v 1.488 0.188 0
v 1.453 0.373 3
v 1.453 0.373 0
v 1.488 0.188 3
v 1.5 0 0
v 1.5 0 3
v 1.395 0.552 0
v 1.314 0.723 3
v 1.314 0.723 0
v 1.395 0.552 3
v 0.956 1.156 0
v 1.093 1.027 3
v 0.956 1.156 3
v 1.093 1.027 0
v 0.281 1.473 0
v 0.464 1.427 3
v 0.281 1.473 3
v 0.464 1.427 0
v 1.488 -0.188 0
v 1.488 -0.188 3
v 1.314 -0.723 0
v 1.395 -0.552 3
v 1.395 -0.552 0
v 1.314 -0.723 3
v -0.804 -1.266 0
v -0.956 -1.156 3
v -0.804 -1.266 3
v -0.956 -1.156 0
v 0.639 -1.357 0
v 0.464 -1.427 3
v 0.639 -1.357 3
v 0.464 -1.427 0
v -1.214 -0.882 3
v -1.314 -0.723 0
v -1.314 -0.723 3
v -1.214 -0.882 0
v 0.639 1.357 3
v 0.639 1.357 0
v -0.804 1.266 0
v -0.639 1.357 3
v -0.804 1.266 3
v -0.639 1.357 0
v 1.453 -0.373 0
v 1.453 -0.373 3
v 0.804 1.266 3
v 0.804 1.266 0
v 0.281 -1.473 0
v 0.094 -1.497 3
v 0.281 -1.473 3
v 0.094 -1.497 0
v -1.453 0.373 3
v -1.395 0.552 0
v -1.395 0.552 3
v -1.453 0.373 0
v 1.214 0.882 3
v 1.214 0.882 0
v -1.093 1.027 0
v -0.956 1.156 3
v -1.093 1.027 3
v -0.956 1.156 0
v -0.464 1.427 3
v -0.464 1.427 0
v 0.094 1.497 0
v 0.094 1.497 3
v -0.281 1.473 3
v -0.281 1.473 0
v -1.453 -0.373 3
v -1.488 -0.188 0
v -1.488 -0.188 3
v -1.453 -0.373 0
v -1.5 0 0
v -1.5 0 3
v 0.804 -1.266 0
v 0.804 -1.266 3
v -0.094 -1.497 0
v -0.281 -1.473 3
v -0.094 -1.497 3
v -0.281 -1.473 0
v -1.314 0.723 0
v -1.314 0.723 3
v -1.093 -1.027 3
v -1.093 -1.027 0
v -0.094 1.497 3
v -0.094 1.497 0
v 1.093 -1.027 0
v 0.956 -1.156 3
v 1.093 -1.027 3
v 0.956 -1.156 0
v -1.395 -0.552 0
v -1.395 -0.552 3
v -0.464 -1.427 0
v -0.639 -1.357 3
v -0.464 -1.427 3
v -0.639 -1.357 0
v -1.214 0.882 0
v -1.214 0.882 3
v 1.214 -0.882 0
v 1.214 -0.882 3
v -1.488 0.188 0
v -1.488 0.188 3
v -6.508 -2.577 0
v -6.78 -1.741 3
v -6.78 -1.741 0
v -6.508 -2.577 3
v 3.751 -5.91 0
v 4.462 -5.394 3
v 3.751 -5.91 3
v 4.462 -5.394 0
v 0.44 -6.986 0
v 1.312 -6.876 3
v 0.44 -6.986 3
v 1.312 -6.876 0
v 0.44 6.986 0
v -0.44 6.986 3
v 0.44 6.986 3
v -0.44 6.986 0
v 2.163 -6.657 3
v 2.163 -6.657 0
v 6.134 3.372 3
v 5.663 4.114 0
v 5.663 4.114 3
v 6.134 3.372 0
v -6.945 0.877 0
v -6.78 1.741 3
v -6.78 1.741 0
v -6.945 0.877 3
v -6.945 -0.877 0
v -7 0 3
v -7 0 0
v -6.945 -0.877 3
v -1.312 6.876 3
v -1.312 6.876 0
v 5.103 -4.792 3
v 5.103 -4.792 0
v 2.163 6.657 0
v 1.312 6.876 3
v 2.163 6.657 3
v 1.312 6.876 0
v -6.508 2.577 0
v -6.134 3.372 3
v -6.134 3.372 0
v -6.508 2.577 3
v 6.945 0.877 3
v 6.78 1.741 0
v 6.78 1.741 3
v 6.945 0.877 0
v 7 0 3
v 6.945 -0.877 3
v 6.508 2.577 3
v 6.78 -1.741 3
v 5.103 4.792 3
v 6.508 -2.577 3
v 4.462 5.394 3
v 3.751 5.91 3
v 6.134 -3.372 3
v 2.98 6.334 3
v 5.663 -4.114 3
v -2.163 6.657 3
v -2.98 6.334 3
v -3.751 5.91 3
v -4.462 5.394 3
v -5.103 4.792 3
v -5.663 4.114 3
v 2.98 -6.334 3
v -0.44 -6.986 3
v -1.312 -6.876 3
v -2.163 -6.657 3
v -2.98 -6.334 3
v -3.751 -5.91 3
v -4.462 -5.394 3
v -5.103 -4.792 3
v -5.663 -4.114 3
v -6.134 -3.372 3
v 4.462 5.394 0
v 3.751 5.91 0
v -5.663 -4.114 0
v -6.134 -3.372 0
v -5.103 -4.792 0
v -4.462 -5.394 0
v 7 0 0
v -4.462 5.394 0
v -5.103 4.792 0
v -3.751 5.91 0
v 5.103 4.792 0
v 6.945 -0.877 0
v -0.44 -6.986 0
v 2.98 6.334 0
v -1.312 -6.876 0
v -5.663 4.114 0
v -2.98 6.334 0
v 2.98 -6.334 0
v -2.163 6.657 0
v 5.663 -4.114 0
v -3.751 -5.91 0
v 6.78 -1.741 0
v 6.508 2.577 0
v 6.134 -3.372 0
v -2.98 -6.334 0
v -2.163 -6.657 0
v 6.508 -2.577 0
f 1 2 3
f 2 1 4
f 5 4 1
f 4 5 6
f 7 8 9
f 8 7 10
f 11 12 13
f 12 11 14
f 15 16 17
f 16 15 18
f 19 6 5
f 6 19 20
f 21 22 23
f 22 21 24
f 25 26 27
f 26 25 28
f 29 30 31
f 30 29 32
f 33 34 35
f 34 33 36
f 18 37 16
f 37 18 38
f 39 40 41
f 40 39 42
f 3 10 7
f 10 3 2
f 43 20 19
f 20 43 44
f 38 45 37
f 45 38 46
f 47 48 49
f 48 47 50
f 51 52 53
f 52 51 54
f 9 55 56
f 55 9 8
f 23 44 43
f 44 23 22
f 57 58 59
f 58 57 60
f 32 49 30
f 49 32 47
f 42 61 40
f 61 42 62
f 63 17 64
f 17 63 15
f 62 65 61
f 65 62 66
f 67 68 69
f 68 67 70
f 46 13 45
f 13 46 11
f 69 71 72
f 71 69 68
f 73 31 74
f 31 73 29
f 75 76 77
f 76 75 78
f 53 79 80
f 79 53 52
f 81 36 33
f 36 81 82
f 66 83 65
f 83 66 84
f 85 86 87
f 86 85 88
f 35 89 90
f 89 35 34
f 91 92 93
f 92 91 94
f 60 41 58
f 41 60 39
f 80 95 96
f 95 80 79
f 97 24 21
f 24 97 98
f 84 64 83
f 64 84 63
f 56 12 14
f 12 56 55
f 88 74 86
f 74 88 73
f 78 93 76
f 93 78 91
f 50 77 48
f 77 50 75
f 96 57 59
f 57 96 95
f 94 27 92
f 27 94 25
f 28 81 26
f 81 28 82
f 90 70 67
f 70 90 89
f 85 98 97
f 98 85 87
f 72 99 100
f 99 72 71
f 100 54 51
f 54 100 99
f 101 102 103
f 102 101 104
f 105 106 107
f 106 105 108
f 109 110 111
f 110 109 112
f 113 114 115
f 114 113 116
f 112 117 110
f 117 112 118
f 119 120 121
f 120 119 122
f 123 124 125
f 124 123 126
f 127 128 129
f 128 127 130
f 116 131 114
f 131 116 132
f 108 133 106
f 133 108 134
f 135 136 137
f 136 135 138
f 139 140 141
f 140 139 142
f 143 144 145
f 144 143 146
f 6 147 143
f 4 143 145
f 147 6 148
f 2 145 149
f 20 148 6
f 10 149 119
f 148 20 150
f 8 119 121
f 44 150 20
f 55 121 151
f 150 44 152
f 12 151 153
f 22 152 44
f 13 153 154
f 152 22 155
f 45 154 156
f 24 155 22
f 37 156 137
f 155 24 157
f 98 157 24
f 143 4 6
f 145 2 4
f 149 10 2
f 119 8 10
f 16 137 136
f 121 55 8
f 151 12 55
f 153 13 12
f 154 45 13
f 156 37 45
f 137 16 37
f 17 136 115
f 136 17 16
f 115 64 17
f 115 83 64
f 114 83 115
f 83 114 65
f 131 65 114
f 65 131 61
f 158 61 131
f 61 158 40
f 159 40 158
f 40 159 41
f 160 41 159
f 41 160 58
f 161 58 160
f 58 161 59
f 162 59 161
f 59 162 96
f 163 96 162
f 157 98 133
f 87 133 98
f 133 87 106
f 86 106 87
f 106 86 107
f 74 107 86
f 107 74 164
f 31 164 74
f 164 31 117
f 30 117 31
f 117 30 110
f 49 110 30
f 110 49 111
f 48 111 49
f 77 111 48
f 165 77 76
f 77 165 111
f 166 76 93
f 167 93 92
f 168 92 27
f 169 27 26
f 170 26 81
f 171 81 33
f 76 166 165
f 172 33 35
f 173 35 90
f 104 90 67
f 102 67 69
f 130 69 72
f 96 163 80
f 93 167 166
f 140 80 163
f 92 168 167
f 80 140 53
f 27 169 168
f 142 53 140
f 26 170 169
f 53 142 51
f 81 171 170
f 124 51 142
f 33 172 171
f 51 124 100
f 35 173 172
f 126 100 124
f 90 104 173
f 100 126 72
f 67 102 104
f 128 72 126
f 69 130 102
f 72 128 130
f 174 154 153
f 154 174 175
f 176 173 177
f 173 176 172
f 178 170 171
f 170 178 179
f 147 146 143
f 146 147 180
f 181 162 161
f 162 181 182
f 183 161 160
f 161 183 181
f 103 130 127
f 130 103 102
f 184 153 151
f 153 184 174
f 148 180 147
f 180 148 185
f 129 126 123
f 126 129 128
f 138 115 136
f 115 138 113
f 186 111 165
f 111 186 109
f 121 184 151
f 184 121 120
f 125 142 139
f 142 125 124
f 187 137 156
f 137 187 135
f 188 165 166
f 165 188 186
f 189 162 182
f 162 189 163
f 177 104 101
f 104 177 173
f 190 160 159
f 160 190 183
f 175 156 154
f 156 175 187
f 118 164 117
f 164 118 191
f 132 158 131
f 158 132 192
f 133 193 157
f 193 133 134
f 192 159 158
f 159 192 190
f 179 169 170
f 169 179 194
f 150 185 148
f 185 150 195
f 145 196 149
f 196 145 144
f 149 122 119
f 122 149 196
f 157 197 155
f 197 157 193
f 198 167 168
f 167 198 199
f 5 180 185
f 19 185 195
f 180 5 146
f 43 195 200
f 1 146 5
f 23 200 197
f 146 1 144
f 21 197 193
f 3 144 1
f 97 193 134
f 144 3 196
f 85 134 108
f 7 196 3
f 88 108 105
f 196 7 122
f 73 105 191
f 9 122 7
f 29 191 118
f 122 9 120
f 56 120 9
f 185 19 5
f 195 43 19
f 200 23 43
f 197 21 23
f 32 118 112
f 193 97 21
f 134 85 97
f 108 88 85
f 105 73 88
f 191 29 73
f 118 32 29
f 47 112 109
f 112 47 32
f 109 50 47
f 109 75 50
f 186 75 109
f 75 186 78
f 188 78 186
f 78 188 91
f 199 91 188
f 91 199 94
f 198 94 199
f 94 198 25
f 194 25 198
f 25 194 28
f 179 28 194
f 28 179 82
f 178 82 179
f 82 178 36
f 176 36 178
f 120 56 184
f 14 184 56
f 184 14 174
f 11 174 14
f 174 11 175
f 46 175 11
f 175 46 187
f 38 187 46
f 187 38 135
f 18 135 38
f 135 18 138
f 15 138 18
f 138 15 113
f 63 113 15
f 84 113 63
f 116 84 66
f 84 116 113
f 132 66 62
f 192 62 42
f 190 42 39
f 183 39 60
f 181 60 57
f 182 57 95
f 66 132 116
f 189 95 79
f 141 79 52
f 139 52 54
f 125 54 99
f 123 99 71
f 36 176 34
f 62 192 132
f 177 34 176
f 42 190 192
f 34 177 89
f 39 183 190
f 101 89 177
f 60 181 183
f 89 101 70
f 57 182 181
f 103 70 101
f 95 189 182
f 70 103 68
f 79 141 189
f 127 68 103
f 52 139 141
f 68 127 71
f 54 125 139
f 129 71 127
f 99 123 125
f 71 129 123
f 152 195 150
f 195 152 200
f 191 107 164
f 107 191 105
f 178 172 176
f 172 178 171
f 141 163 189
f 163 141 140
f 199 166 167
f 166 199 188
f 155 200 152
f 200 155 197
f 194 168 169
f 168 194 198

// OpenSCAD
$fn = 50;


difference() {
	union() {
		cylinder(h = 3, r = 7.0000000000);
	}
	union() {
		translate(v = [0, 0, -100]) {
			cylinder(h = 200, r = 1.5000000000);
		}
		translate(v = [0, 0, -100]) {
			cylinder(h = 200, r = 1.5000000000);
		}
	}
}
